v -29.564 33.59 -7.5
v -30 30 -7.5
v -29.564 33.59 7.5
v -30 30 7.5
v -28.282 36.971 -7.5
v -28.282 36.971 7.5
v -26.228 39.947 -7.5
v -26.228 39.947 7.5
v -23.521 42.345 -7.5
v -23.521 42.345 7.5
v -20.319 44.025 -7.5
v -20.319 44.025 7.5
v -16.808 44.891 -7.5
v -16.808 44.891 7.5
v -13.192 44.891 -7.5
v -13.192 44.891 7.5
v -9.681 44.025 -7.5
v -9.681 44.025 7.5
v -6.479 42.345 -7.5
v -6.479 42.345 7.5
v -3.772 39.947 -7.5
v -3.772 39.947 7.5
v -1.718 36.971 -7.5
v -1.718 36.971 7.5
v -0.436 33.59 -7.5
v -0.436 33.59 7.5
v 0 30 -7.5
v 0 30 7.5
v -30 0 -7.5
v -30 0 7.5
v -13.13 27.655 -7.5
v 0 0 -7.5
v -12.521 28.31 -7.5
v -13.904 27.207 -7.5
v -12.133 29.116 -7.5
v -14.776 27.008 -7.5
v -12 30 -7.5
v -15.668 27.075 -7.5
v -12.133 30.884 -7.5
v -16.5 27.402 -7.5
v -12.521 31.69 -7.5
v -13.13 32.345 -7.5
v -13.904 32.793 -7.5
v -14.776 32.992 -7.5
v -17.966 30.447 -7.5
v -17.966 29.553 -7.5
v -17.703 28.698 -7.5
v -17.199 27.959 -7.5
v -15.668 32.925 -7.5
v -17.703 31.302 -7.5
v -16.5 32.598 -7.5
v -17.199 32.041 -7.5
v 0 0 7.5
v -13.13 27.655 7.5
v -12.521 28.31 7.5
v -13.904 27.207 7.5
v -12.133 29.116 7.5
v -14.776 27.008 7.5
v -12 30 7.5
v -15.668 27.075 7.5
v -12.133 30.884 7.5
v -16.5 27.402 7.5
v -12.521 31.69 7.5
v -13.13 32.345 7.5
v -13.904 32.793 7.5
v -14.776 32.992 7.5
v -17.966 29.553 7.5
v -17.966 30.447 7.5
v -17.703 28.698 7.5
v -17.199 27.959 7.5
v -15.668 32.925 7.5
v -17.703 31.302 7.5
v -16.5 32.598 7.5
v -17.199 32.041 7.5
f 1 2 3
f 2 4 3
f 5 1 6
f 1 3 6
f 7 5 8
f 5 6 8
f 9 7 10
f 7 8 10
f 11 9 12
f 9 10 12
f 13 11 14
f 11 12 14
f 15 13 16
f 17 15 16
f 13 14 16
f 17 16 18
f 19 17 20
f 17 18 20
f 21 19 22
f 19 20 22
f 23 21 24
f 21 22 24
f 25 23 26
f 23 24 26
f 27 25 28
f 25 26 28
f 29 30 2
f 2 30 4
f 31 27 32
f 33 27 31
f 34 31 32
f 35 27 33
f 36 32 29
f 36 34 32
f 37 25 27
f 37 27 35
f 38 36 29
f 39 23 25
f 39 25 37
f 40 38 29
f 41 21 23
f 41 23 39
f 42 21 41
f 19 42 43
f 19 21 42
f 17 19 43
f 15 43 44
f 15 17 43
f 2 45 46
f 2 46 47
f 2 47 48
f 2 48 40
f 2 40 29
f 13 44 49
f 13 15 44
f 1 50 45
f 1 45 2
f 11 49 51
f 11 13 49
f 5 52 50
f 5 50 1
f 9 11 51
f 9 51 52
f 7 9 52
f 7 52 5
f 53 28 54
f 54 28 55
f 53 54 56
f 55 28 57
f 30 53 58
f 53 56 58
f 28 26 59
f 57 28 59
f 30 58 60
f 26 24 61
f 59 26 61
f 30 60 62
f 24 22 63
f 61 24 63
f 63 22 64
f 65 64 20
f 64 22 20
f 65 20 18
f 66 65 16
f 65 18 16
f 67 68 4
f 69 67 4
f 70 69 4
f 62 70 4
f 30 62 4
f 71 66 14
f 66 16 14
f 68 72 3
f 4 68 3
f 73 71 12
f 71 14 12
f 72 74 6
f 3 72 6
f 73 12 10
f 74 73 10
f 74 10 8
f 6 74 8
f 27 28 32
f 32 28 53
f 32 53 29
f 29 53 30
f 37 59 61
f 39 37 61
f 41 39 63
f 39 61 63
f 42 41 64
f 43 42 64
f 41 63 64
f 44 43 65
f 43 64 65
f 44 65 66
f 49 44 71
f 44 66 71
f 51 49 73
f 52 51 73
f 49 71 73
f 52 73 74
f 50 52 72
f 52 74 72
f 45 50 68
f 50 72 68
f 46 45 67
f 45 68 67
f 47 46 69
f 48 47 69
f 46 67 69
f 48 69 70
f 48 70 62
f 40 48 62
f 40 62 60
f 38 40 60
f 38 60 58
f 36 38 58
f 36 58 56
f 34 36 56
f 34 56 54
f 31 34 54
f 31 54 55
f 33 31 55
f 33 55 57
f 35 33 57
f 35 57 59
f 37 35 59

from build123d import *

# Parameters (mm, degrees)
SALIENTE_EXTRUIR1_DEPTH = 7.5
CROQUIS3_R              = 3
CORTAR_EXTRUIR1_DEPTH   = 57.124860802


with BuildPart() as part:
    # Croquis2 → Saliente-Extruir1 (new, symmetric)
    with BuildSketch(Plane.XY):
        with BuildLine():
            Line((0, 0), (-30, 0))
            Line((-30, 0), (-30, 30))
            ThreePointArc((-30, 30), (-15, 45), (0, 30))
            Line((0, 30), (0, 0))
        make_face()
    extrude(amount=SALIENTE_EXTRUIR1_DEPTH, both=True)

    # Croquis3 → Cortar-Extruir1 (cut, through all)
    with BuildSketch(Plane.XY.offset(7.5)):
        with Locations((-15, 30)):
            Circle(CROQUIS3_R)
    extrude(amount=-CORTAR_EXTRUIR1_DEPTH, mode=Mode.SUBTRACT)


solid = part.part
